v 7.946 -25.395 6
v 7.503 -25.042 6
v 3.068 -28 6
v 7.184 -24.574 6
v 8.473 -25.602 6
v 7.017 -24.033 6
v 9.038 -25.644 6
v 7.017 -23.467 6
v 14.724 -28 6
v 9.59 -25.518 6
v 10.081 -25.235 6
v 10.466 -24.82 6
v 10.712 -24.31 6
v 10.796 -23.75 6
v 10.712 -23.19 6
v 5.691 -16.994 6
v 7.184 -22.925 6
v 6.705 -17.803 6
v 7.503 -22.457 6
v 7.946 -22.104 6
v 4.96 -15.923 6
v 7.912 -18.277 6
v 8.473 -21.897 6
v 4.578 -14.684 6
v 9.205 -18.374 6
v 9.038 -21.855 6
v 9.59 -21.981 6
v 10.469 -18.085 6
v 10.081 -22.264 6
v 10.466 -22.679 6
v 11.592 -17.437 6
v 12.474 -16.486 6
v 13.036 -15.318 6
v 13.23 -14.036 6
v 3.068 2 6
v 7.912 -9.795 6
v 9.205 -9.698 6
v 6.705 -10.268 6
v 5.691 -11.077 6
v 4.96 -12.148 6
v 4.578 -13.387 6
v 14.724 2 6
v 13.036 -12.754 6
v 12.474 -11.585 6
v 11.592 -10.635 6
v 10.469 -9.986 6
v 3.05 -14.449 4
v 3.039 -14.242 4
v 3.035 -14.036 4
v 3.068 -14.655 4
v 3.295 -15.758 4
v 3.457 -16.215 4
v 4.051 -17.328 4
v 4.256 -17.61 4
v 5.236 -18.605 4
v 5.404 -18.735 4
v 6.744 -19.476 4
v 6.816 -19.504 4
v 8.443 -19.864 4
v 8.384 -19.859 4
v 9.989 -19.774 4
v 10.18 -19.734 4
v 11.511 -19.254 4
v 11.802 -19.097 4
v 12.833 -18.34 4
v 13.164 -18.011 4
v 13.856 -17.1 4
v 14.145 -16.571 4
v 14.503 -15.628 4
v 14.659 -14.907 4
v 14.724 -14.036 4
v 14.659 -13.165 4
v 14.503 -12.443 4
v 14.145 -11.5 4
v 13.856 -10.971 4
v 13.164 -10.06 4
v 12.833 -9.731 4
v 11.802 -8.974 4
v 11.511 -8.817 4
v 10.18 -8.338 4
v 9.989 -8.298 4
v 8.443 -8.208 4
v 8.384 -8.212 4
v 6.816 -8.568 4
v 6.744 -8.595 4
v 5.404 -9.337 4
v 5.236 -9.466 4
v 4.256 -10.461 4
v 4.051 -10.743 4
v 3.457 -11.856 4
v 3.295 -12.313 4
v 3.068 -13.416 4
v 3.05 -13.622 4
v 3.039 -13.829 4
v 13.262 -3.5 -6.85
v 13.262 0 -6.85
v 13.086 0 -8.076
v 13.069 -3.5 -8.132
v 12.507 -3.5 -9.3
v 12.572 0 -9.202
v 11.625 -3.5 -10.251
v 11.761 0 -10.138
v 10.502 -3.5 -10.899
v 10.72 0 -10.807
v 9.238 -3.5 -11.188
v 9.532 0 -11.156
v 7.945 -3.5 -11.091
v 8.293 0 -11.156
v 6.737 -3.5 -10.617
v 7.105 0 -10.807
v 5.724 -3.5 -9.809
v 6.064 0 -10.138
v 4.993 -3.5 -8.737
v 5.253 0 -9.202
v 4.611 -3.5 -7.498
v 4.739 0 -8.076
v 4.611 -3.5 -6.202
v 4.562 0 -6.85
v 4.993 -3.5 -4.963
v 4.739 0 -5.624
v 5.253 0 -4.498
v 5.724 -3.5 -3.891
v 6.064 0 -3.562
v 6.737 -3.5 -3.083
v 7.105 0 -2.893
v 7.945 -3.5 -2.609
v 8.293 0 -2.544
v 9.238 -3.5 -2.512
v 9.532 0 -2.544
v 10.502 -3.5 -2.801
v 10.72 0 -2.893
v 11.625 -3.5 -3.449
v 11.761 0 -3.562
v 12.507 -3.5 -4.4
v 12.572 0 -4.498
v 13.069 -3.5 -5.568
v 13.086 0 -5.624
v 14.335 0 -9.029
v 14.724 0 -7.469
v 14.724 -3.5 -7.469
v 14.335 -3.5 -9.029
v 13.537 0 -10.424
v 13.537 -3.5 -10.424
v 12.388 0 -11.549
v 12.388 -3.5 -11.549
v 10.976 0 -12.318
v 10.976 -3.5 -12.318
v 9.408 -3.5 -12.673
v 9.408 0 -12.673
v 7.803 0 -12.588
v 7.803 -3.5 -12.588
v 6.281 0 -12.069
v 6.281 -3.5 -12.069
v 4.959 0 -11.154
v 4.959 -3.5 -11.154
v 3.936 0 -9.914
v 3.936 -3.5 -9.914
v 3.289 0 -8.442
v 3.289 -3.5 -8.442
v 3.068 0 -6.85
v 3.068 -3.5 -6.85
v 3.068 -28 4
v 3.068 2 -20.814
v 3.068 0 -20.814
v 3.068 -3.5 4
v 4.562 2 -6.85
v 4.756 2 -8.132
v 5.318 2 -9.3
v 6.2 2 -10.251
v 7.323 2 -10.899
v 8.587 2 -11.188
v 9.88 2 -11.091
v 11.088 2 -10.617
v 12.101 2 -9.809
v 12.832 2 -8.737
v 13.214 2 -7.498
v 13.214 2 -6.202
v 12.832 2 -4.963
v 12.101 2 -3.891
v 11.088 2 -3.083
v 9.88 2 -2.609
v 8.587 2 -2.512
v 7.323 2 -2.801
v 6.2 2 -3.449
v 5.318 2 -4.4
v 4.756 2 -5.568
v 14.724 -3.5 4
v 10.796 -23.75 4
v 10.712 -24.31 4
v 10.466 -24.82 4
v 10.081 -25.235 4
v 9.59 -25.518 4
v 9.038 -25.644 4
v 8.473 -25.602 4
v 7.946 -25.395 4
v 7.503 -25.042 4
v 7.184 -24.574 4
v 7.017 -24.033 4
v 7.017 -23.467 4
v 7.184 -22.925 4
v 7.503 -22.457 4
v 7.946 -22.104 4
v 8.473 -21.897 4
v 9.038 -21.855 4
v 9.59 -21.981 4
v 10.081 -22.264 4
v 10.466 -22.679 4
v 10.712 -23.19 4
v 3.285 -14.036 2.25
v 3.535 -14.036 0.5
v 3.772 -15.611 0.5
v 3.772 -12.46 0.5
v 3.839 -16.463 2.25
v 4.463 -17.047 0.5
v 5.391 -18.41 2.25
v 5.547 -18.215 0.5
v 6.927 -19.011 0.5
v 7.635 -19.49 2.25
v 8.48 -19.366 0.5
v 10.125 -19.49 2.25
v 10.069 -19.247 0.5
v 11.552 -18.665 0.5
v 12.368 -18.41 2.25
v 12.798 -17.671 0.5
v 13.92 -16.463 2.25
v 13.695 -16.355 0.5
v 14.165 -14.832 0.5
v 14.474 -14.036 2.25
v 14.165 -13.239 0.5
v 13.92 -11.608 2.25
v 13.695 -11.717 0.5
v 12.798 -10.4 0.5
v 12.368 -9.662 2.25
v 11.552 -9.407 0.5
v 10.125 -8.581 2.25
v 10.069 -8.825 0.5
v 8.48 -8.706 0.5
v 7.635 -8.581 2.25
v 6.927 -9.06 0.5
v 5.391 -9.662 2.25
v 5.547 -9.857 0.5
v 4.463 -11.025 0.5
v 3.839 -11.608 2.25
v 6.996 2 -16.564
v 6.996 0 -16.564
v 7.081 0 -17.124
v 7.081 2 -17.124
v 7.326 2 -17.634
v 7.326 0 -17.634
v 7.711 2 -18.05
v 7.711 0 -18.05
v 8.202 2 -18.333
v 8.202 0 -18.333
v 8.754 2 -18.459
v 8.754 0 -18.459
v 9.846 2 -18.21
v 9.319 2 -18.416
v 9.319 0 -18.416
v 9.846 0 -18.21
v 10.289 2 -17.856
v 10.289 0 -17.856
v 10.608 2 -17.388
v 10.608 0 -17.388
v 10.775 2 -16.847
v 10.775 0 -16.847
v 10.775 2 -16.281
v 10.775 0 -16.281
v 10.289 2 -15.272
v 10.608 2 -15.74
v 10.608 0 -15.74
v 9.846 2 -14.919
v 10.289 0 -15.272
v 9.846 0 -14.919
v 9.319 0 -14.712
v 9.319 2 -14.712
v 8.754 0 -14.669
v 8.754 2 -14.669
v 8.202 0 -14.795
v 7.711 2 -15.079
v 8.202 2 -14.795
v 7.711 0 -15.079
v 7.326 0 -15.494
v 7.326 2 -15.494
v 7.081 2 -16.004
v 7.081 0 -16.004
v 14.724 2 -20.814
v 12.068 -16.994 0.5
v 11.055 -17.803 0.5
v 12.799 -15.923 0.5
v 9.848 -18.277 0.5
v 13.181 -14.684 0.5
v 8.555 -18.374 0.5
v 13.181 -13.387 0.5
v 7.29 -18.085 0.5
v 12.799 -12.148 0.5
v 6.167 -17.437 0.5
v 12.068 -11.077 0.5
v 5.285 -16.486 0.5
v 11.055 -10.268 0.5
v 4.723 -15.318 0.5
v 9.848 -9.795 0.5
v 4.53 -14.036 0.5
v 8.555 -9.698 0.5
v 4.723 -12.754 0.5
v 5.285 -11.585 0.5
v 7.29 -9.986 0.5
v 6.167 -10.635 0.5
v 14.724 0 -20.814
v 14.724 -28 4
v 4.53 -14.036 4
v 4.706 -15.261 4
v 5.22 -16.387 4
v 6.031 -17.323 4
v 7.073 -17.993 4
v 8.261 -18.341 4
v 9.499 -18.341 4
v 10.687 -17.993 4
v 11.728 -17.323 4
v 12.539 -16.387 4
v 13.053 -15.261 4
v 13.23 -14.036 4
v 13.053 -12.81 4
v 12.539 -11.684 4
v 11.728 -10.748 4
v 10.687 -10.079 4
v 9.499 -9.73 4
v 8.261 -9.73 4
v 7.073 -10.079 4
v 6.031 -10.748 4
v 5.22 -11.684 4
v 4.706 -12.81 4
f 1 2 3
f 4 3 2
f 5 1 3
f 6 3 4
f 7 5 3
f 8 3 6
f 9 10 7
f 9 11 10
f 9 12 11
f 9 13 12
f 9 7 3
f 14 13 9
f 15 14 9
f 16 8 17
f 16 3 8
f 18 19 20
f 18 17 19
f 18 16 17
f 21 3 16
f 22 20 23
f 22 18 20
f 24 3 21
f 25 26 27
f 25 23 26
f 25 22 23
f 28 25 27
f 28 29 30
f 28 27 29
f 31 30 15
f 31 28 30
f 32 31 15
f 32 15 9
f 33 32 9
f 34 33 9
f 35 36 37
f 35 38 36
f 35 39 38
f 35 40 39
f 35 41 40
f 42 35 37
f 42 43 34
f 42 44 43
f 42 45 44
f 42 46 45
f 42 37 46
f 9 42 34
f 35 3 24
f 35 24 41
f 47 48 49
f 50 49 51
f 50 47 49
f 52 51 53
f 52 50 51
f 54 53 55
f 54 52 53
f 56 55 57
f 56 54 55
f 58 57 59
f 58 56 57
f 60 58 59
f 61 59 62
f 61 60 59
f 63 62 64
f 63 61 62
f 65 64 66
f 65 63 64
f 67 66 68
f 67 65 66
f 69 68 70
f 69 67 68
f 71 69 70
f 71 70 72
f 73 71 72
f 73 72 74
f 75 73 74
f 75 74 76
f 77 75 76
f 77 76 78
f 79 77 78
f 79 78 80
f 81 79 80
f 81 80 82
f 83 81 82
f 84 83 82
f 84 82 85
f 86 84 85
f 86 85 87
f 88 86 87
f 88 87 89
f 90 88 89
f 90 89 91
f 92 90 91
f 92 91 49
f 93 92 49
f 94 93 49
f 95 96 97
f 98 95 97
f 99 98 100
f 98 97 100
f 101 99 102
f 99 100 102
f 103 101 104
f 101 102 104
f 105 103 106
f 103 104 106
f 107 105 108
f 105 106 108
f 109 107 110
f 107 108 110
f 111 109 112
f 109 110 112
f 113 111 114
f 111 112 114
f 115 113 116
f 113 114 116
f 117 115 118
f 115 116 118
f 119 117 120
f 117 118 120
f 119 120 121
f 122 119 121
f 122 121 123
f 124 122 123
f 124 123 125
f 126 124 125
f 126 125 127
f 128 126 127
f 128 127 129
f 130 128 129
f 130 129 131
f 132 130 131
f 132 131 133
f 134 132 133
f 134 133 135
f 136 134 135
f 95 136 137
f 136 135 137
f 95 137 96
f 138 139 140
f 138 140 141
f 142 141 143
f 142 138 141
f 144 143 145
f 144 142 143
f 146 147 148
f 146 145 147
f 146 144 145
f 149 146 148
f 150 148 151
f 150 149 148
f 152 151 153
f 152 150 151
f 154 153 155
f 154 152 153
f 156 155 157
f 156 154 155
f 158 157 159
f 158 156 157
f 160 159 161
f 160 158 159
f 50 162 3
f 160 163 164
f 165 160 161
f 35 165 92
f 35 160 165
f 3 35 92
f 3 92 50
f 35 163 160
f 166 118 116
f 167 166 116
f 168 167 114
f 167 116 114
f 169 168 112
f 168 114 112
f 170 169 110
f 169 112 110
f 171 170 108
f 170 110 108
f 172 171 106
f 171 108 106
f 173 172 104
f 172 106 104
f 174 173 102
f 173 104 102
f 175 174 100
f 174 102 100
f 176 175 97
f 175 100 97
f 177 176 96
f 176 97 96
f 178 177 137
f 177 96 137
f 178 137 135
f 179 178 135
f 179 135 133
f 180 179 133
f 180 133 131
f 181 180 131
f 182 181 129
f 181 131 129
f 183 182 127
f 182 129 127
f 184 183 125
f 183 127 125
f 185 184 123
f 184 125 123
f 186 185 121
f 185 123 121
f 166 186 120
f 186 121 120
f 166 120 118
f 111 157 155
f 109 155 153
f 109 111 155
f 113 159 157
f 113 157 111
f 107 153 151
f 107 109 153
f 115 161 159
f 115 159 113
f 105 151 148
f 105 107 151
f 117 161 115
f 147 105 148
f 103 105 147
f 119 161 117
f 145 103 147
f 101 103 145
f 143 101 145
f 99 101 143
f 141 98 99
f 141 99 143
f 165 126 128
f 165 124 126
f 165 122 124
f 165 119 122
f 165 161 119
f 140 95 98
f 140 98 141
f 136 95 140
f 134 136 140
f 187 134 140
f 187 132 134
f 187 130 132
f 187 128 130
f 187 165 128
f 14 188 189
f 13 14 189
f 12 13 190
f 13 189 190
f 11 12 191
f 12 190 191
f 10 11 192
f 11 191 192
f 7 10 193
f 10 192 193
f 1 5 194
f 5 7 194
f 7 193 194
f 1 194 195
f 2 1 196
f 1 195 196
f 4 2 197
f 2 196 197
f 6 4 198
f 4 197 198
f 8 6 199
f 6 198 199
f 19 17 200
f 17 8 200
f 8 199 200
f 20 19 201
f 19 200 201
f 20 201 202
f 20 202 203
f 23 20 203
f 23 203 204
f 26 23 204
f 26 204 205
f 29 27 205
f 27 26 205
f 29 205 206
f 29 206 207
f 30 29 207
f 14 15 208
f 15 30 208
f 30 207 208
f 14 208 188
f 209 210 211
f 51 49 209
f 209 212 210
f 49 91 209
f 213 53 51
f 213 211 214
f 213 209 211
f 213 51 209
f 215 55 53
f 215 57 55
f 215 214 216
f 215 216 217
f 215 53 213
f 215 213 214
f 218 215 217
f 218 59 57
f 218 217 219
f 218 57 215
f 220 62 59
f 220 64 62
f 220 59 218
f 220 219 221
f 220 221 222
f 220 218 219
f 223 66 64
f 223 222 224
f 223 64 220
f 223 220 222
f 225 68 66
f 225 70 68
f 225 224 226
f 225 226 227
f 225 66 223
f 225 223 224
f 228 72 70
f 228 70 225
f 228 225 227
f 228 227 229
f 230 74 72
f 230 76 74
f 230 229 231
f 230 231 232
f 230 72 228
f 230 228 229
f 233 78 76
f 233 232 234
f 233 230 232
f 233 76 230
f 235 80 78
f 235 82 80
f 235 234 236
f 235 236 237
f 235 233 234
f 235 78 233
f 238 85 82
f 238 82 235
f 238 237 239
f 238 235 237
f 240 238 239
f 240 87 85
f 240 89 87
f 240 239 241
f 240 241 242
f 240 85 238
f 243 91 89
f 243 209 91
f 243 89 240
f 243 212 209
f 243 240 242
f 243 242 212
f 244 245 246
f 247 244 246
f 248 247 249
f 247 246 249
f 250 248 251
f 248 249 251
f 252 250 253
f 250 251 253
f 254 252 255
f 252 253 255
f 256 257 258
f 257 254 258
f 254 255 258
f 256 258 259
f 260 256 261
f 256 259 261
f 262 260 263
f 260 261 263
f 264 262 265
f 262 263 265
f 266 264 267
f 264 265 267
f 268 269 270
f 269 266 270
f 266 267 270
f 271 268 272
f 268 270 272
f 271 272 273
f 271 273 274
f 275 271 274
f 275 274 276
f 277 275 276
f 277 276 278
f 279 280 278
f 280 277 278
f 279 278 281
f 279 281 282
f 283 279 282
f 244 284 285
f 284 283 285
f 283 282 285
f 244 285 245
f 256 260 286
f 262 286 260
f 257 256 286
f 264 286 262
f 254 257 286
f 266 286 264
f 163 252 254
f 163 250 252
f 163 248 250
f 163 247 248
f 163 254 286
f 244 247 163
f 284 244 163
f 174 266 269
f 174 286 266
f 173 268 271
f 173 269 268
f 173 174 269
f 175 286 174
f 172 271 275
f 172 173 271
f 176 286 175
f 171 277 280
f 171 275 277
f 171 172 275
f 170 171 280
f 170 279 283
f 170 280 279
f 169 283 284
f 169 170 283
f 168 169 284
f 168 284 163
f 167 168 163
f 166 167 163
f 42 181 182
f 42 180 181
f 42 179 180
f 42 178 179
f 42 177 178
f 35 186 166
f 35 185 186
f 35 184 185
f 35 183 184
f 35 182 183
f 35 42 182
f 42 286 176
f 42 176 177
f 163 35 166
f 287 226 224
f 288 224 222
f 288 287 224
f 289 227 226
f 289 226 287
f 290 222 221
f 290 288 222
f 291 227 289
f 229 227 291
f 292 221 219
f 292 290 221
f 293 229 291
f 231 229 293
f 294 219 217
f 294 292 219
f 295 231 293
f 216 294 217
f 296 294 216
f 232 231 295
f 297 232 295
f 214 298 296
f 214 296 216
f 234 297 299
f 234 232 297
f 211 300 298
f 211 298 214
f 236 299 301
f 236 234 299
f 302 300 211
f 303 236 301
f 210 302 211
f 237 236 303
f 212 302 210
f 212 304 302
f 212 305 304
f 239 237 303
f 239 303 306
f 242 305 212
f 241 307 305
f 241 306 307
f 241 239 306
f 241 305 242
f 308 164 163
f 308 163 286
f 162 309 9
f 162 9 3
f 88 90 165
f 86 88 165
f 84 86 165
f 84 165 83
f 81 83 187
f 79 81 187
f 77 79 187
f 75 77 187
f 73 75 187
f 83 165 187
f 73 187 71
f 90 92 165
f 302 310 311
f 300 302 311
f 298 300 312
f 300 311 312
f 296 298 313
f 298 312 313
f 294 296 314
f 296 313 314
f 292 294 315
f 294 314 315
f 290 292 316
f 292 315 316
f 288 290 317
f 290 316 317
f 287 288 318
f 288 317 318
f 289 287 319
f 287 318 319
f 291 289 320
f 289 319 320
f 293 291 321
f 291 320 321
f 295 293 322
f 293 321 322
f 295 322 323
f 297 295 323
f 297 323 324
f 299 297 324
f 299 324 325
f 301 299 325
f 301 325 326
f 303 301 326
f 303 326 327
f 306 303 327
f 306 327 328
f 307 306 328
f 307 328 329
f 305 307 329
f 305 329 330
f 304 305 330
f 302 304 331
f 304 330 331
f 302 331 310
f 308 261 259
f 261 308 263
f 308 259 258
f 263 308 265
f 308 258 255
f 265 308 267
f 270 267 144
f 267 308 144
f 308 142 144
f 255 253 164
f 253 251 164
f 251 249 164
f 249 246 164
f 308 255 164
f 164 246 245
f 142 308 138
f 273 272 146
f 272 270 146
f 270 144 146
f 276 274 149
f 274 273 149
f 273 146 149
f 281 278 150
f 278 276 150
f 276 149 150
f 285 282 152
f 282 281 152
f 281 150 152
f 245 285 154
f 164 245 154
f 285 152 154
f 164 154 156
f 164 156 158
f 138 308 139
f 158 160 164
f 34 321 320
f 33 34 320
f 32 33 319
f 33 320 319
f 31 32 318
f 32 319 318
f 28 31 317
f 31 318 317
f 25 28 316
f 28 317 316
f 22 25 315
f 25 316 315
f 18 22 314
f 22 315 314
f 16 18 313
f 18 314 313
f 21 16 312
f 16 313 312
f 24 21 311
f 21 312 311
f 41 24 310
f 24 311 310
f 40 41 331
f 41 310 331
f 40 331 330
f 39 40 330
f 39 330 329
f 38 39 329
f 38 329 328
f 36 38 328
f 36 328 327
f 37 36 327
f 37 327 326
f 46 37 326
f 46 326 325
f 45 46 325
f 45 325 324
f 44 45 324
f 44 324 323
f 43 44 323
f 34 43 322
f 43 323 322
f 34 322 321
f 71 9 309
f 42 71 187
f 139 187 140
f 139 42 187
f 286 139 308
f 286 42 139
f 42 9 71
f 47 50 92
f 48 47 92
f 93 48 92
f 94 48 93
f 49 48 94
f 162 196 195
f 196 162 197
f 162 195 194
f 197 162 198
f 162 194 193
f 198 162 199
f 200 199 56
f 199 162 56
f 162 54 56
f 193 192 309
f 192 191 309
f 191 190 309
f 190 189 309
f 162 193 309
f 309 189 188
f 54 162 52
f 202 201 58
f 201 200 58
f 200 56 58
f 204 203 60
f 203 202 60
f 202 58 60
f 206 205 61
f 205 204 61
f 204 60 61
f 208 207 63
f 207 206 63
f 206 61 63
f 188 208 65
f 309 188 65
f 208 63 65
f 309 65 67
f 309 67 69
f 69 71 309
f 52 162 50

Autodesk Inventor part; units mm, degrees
ref_plane "YZ Plane" through (0, 0, 0) normal (1, 0, 0) x (0, 1, 0)
ref_plane "XZ Plane" through (0, 0, 0) normal (0, 1, 0) x (-1, 0, 0)
ref_plane "XY Plane" through (0, 0, 0) normal (0, 0, 1) x (1, 0, 0)
sketch "Sketch1" plane through (0, 0, 0) normal (0, 1, 0) x (-1, 0, 0)
  line L0 (-2.2837, -0.9982) -> (0.008, -0.7055) construction
  line L1 (2.6844, -8.3272) -> (2.6844, -12.3272) construction
  line L2 (64.2192, 40.0403) -> (72.5206, 41.3734) construction
  line L3 (64.2192, 39.2192) -> (64.2192, 44.778) construction
  line L4 (-8.9125, -2.5) -> (-8.9125, -6.85) construction
  line L5 (-14.9605, -0.9982) -> (-2.2837, -0.9982) construction
  line L6 (55.95, 41.2553) -> (64.2192, 40.0403) construction
  circle A0 centre (-8.9125, -6.85) radius 4.35
  line L7 (-14.724, -20.8143) -> (-17.8001, -0.7055) construction
  line L8 (-3.0681, -20.8143) -> (0.008, -0.7055) construction
  line L9 (-11.8961, -14.832) -> (-8.8961, -13.1) construction
  line L10 (-8.8961, -13.1) -> (-5.8961, -14.832) construction
  line L11 (-3.0681, -20.8143) -> (-14.724, -20.8143)
  circle A1 centre (-8.8961, -16.5641) radius 1.9
  line L12 (64.2192, 39.2192) -> (64.2192, 43.7357)
  line L13 (-14.9605, -0.9982) -> (-17.8001, -0.7055) construction
  line L14 (-8.8961, -20.8143) -> (-3.0681, -20.8143) construction
  line L15 (-14.724, -20.8143) -> (-3.0681, -20.8143) construction
  line L16 (-8.8258, -6.8795) -> (-8.8093, -6.8795) construction
  line L17 (-5.8961, -14.832) -> (-5.3727, -20.8143) construction
  line L18 (-11.8961, -14.832) -> (-12.4194, -20.8143) construction
  line L19 (-14.2025, 0) -> (-14.2025, -2.5) construction
  line L20 (-14.2025, -2.5) -> (-3.6225, -2.5) construction
  line L21 (-8.9125, -2.5) -> (-8.9125, 0.8916) construction
  line L22 (-3.6225, -20.8143) -> (-14.2025, -20.8143) construction
  line L23 (-3.6225, -20.8143) -> (-14.2025, -20.8143)
  line L24 (-8.9125, -6.85) -> (-13.2625, -6.85) construction
  line L25 (-13.2625, -6.85) -> (-14.2025, -6.85) construction
  line L26 (-3.0681, -20.8143) -> (-3.0681, 0)
  line L27 (-14.724, -20.8143) -> (-14.724, 0) construction
  line L28 (-14.724, 0) -> (-14.2025, 0) construction
  line L29 (-14.724, -20.8143) -> (-14.724, 0)
  line L30 (-14.2025, 0) -> (-14.724, 0)
  line L31 (-3.0681, 0) -> (-3.0681, 4)
  line L32 (-3.0681, 4) -> (-14.724, 4)
  line L33 (-14.724, 0) -> (-14.724, 4)
  point P0 (-0.8016, -0.9982)
  point P1 (-16.9905, -0.9982)
  point P2 (-5.8961, -16.5641)
  point P3 (-8.8961, -16.5641)
  point P4 (-11.8961, -20.8143)
  point P5 (-5.8961, -20.8143)
  dimension "d27" = 3.8
  dimension "d28" = 4
  dimension "d29" = 0.0164
  dimension "d31" = 2.5
  dimension "d36" = 4
extrude "Extrusion1" add sketch "Sketch1" along normal blind 2
sketch "Sketch5" plane through (3.0681, 0, 4) normal (0, 0, 1) x (1, 0, 0)
  line L0 (5.6876, -20.2886) -> (8.131, -18.0087) construction
  line L1 (5.8983, -14.0653) -> (5.9147, -14.0653) construction
  line L2 (0, -28) -> (-3.0761, -7.8912) construction
  circle A0 centre (5.8115, -14.0357) radius 4.35
  line L3 (11.6559, -28) -> (14.732, -7.8912) construction
  line L4 (5.8115, -9.6857) -> (5.8115, -14.0357) construction
  line L5 (-22.6444, -7.0488) -> (-20.3527, -6.7561) construction
  circle A1 centre (5.828, -23.7498) radius 1.9
  line L6 (2.828, -22.0178) -> (2.3046, -28) construction
  line L7 (11.6559, -28) -> (0, -28) construction
  line L8 (0, -28) -> (11.6559, -28) construction
  line L9 (5.828, -28) -> (11.6559, -28) construction
  line L10 (8.131, -18.0087) -> (9.3514, -28) construction
  line L11 (2.828, -22.0178) -> (5.6876, -20.2886) construction
  line L12 (-35.3212, -7.0488) -> (-22.6444, -7.0488) construction
  line L13 (-35.3212, -7.0488) -> (-38.1608, -6.7561) construction
  line L14 (0.5215, -7.1857) -> (0.5215, -9.6857) construction
  line L15 (0.5215, -9.6857) -> (11.1015, -9.6857) construction
  line L16 (5.8115, -9.6857) -> (5.8115, -6.2941) construction
  line L17 (11.1015, -28) -> (0.5215, -28) construction
  line L18 (11.1015, -28) -> (0.5215, -28) construction
  line L19 (5.8115, -14.0357) -> (1.4615, -14.0357) construction
  line L20 (1.4615, -14.0357) -> (0.5215, -14.0357) construction
  line L21 (11.6559, -28) -> (11.6559, -7.1857) construction
  line L22 (0, -28) -> (0, -7.1857) construction
  line L23 (-35.0847, -6.0506) -> (-34.5632, -6.0506) construction
  line L24 (0, -28) -> (0, -7.1857) construction
  line L25 (-34.5632, -6.0506) -> (-35.0847, -6.0506) construction
  line L26 (-23.4288, -6.0506) -> (-23.4288, -2.0506) construction
  line L27 (-23.4288, -2.0506) -> (-35.0847, -2.0506) construction
  line L28 (-35.0847, -6.0506) -> (-35.0847, -2.0506) construction
  line L29 (0, 0) -> (11.6559, 0) projected
  line L30 (11.6559, 0) -> (11.6559, 2) projected
  line L31 (0, 2) -> (11.6559, 2) projected
  line L32 (0, 0) -> (0, 2) projected
  line L33 (0, 2) -> (11.6559, 2)
  line L34 (11.6559, 2) -> (11.6559, -28)
  line L35 (11.6559, -28) -> (0, -28)
  line L36 (0, -28) -> (0, 2)
  line L37 (5.828, -28) -> (5.828, -33.9662)
  line L38 (5.828, -28) -> (5.7489, -34.6939)
  point P0 (-4.0686, -7.3836)
  point P1 (8.828, -23.7498)
  point P2 (2.828, -28)
  point P3 (8.828, -28)
  point P4 (-37.3512, -7.0488)
  dimension "d38" = 3.8
  dimension "d40" = 0.0164
  dimension "d41" = 2.5
  dimension "d42" = 4
  dimension "d43" = 30
extrude "Extrusion5" add sketch "Sketch5" along normal blind 2
sketch "Sketch6" plane through (3.0681, 0, 4) normal (0, 0, -1) x (-1, 0, 0)
  line L0 (0, 0) -> (-11.6559, 0) projected
  line L1 (-11.6559, -28) -> (-11.6559, 0) projected
  line L2 (0, -28) -> (-11.6559, -28) projected
  line L3 (0, 0) -> (0, -28) projected
  circle A0 centre (-5.828, -23.7498) radius 1.9 projected
  circle A1 centre (-5.8115, -14.0357) radius 4.35 projected
  circle A2 centre (-5.8115, -14.0357) radius 4.35
  circle A3 centre (-5.8115, -14.0357) radius 5.8444
  line L4 (-11.6559, -28) -> (-11.6559, 0) projected
  point P0 (3.0681, 0)
extrude "Extrusion6" add sketch "Sketch6" along normal blind 3.5 contours A3 L3 | L3 A3
chamfer "Chamfer1" distance 0.5 distance2 3.5 1 edges at (14.724, -14.0357, 0.5) measured on face at (3.6321, -14.849, 0.5)
sketch "Sketch8" plane through (0, 0, 0) normal (0, -1, 0) x (1, 0, 0)
  circle A0 centre (8.9125, -6.85) radius 4.35 projected
  circle A1 centre (8.8961, -16.5641) radius 1.9 projected
  line L0 (14.724, -20.8143) -> (3.0681, -20.8143) projected
  line L1 (14.724, 4) -> (14.724, -20.8143) projected
  line L2 (3.0681, 4) -> (14.724, 4) projected
  line L3 (3.0681, -20.8143) -> (3.0681, 4) projected
  arc A2 (3.0681, -6.85) -> (14.724, -7.4691) centre (8.9125, -6.85) ccw
  line L4 (48.394, -18.4641) -> (53.1571, -15.7141)
  line L5 (51.5694, -18.4641) -> (49.9817, -21.2141)
  line L6 (49.9817, -21.2141) -> (46.8063, -21.2141)
  line L7 (46.8063, -21.2141) -> (45.2186, -18.4641)
  line L8 (45.2186, -18.4641) -> (46.8063, -15.7141)
  line L9 (46.8063, -15.7141) -> (49.9817, -15.7141)
  line L10 (49.9817, -15.7141) -> (51.5694, -18.4641)
  line L11 (8.8961, -16.5641) -> (13.6592, -13.8141)
  line L12 (12.0715, -16.5641) -> (10.4838, -19.3141)
  line L13 (10.4838, -19.3141) -> (7.3083, -19.3141)
  line L14 (7.3083, -19.3141) -> (5.7206, -16.5641)
  line L15 (5.7206, -16.5641) -> (7.3083, -13.8141)
  line L16 (7.3083, -13.8141) -> (10.4838, -13.8141)
  line L17 (10.4838, -13.8141) -> (12.0715, -16.5641)
  point P0 (0, 0)
  point P1 (50.7756, -17.0891)
  point P2 (11.2776, -15.1891)
  dimension "d53" = 5.5
  dimension "d54" = 5.5
extrude "Extrusion7" add sketch "Sketch8" along normal blind 3.5 contours A2 L3 L2 L1
properties part number "Now as three El L"
